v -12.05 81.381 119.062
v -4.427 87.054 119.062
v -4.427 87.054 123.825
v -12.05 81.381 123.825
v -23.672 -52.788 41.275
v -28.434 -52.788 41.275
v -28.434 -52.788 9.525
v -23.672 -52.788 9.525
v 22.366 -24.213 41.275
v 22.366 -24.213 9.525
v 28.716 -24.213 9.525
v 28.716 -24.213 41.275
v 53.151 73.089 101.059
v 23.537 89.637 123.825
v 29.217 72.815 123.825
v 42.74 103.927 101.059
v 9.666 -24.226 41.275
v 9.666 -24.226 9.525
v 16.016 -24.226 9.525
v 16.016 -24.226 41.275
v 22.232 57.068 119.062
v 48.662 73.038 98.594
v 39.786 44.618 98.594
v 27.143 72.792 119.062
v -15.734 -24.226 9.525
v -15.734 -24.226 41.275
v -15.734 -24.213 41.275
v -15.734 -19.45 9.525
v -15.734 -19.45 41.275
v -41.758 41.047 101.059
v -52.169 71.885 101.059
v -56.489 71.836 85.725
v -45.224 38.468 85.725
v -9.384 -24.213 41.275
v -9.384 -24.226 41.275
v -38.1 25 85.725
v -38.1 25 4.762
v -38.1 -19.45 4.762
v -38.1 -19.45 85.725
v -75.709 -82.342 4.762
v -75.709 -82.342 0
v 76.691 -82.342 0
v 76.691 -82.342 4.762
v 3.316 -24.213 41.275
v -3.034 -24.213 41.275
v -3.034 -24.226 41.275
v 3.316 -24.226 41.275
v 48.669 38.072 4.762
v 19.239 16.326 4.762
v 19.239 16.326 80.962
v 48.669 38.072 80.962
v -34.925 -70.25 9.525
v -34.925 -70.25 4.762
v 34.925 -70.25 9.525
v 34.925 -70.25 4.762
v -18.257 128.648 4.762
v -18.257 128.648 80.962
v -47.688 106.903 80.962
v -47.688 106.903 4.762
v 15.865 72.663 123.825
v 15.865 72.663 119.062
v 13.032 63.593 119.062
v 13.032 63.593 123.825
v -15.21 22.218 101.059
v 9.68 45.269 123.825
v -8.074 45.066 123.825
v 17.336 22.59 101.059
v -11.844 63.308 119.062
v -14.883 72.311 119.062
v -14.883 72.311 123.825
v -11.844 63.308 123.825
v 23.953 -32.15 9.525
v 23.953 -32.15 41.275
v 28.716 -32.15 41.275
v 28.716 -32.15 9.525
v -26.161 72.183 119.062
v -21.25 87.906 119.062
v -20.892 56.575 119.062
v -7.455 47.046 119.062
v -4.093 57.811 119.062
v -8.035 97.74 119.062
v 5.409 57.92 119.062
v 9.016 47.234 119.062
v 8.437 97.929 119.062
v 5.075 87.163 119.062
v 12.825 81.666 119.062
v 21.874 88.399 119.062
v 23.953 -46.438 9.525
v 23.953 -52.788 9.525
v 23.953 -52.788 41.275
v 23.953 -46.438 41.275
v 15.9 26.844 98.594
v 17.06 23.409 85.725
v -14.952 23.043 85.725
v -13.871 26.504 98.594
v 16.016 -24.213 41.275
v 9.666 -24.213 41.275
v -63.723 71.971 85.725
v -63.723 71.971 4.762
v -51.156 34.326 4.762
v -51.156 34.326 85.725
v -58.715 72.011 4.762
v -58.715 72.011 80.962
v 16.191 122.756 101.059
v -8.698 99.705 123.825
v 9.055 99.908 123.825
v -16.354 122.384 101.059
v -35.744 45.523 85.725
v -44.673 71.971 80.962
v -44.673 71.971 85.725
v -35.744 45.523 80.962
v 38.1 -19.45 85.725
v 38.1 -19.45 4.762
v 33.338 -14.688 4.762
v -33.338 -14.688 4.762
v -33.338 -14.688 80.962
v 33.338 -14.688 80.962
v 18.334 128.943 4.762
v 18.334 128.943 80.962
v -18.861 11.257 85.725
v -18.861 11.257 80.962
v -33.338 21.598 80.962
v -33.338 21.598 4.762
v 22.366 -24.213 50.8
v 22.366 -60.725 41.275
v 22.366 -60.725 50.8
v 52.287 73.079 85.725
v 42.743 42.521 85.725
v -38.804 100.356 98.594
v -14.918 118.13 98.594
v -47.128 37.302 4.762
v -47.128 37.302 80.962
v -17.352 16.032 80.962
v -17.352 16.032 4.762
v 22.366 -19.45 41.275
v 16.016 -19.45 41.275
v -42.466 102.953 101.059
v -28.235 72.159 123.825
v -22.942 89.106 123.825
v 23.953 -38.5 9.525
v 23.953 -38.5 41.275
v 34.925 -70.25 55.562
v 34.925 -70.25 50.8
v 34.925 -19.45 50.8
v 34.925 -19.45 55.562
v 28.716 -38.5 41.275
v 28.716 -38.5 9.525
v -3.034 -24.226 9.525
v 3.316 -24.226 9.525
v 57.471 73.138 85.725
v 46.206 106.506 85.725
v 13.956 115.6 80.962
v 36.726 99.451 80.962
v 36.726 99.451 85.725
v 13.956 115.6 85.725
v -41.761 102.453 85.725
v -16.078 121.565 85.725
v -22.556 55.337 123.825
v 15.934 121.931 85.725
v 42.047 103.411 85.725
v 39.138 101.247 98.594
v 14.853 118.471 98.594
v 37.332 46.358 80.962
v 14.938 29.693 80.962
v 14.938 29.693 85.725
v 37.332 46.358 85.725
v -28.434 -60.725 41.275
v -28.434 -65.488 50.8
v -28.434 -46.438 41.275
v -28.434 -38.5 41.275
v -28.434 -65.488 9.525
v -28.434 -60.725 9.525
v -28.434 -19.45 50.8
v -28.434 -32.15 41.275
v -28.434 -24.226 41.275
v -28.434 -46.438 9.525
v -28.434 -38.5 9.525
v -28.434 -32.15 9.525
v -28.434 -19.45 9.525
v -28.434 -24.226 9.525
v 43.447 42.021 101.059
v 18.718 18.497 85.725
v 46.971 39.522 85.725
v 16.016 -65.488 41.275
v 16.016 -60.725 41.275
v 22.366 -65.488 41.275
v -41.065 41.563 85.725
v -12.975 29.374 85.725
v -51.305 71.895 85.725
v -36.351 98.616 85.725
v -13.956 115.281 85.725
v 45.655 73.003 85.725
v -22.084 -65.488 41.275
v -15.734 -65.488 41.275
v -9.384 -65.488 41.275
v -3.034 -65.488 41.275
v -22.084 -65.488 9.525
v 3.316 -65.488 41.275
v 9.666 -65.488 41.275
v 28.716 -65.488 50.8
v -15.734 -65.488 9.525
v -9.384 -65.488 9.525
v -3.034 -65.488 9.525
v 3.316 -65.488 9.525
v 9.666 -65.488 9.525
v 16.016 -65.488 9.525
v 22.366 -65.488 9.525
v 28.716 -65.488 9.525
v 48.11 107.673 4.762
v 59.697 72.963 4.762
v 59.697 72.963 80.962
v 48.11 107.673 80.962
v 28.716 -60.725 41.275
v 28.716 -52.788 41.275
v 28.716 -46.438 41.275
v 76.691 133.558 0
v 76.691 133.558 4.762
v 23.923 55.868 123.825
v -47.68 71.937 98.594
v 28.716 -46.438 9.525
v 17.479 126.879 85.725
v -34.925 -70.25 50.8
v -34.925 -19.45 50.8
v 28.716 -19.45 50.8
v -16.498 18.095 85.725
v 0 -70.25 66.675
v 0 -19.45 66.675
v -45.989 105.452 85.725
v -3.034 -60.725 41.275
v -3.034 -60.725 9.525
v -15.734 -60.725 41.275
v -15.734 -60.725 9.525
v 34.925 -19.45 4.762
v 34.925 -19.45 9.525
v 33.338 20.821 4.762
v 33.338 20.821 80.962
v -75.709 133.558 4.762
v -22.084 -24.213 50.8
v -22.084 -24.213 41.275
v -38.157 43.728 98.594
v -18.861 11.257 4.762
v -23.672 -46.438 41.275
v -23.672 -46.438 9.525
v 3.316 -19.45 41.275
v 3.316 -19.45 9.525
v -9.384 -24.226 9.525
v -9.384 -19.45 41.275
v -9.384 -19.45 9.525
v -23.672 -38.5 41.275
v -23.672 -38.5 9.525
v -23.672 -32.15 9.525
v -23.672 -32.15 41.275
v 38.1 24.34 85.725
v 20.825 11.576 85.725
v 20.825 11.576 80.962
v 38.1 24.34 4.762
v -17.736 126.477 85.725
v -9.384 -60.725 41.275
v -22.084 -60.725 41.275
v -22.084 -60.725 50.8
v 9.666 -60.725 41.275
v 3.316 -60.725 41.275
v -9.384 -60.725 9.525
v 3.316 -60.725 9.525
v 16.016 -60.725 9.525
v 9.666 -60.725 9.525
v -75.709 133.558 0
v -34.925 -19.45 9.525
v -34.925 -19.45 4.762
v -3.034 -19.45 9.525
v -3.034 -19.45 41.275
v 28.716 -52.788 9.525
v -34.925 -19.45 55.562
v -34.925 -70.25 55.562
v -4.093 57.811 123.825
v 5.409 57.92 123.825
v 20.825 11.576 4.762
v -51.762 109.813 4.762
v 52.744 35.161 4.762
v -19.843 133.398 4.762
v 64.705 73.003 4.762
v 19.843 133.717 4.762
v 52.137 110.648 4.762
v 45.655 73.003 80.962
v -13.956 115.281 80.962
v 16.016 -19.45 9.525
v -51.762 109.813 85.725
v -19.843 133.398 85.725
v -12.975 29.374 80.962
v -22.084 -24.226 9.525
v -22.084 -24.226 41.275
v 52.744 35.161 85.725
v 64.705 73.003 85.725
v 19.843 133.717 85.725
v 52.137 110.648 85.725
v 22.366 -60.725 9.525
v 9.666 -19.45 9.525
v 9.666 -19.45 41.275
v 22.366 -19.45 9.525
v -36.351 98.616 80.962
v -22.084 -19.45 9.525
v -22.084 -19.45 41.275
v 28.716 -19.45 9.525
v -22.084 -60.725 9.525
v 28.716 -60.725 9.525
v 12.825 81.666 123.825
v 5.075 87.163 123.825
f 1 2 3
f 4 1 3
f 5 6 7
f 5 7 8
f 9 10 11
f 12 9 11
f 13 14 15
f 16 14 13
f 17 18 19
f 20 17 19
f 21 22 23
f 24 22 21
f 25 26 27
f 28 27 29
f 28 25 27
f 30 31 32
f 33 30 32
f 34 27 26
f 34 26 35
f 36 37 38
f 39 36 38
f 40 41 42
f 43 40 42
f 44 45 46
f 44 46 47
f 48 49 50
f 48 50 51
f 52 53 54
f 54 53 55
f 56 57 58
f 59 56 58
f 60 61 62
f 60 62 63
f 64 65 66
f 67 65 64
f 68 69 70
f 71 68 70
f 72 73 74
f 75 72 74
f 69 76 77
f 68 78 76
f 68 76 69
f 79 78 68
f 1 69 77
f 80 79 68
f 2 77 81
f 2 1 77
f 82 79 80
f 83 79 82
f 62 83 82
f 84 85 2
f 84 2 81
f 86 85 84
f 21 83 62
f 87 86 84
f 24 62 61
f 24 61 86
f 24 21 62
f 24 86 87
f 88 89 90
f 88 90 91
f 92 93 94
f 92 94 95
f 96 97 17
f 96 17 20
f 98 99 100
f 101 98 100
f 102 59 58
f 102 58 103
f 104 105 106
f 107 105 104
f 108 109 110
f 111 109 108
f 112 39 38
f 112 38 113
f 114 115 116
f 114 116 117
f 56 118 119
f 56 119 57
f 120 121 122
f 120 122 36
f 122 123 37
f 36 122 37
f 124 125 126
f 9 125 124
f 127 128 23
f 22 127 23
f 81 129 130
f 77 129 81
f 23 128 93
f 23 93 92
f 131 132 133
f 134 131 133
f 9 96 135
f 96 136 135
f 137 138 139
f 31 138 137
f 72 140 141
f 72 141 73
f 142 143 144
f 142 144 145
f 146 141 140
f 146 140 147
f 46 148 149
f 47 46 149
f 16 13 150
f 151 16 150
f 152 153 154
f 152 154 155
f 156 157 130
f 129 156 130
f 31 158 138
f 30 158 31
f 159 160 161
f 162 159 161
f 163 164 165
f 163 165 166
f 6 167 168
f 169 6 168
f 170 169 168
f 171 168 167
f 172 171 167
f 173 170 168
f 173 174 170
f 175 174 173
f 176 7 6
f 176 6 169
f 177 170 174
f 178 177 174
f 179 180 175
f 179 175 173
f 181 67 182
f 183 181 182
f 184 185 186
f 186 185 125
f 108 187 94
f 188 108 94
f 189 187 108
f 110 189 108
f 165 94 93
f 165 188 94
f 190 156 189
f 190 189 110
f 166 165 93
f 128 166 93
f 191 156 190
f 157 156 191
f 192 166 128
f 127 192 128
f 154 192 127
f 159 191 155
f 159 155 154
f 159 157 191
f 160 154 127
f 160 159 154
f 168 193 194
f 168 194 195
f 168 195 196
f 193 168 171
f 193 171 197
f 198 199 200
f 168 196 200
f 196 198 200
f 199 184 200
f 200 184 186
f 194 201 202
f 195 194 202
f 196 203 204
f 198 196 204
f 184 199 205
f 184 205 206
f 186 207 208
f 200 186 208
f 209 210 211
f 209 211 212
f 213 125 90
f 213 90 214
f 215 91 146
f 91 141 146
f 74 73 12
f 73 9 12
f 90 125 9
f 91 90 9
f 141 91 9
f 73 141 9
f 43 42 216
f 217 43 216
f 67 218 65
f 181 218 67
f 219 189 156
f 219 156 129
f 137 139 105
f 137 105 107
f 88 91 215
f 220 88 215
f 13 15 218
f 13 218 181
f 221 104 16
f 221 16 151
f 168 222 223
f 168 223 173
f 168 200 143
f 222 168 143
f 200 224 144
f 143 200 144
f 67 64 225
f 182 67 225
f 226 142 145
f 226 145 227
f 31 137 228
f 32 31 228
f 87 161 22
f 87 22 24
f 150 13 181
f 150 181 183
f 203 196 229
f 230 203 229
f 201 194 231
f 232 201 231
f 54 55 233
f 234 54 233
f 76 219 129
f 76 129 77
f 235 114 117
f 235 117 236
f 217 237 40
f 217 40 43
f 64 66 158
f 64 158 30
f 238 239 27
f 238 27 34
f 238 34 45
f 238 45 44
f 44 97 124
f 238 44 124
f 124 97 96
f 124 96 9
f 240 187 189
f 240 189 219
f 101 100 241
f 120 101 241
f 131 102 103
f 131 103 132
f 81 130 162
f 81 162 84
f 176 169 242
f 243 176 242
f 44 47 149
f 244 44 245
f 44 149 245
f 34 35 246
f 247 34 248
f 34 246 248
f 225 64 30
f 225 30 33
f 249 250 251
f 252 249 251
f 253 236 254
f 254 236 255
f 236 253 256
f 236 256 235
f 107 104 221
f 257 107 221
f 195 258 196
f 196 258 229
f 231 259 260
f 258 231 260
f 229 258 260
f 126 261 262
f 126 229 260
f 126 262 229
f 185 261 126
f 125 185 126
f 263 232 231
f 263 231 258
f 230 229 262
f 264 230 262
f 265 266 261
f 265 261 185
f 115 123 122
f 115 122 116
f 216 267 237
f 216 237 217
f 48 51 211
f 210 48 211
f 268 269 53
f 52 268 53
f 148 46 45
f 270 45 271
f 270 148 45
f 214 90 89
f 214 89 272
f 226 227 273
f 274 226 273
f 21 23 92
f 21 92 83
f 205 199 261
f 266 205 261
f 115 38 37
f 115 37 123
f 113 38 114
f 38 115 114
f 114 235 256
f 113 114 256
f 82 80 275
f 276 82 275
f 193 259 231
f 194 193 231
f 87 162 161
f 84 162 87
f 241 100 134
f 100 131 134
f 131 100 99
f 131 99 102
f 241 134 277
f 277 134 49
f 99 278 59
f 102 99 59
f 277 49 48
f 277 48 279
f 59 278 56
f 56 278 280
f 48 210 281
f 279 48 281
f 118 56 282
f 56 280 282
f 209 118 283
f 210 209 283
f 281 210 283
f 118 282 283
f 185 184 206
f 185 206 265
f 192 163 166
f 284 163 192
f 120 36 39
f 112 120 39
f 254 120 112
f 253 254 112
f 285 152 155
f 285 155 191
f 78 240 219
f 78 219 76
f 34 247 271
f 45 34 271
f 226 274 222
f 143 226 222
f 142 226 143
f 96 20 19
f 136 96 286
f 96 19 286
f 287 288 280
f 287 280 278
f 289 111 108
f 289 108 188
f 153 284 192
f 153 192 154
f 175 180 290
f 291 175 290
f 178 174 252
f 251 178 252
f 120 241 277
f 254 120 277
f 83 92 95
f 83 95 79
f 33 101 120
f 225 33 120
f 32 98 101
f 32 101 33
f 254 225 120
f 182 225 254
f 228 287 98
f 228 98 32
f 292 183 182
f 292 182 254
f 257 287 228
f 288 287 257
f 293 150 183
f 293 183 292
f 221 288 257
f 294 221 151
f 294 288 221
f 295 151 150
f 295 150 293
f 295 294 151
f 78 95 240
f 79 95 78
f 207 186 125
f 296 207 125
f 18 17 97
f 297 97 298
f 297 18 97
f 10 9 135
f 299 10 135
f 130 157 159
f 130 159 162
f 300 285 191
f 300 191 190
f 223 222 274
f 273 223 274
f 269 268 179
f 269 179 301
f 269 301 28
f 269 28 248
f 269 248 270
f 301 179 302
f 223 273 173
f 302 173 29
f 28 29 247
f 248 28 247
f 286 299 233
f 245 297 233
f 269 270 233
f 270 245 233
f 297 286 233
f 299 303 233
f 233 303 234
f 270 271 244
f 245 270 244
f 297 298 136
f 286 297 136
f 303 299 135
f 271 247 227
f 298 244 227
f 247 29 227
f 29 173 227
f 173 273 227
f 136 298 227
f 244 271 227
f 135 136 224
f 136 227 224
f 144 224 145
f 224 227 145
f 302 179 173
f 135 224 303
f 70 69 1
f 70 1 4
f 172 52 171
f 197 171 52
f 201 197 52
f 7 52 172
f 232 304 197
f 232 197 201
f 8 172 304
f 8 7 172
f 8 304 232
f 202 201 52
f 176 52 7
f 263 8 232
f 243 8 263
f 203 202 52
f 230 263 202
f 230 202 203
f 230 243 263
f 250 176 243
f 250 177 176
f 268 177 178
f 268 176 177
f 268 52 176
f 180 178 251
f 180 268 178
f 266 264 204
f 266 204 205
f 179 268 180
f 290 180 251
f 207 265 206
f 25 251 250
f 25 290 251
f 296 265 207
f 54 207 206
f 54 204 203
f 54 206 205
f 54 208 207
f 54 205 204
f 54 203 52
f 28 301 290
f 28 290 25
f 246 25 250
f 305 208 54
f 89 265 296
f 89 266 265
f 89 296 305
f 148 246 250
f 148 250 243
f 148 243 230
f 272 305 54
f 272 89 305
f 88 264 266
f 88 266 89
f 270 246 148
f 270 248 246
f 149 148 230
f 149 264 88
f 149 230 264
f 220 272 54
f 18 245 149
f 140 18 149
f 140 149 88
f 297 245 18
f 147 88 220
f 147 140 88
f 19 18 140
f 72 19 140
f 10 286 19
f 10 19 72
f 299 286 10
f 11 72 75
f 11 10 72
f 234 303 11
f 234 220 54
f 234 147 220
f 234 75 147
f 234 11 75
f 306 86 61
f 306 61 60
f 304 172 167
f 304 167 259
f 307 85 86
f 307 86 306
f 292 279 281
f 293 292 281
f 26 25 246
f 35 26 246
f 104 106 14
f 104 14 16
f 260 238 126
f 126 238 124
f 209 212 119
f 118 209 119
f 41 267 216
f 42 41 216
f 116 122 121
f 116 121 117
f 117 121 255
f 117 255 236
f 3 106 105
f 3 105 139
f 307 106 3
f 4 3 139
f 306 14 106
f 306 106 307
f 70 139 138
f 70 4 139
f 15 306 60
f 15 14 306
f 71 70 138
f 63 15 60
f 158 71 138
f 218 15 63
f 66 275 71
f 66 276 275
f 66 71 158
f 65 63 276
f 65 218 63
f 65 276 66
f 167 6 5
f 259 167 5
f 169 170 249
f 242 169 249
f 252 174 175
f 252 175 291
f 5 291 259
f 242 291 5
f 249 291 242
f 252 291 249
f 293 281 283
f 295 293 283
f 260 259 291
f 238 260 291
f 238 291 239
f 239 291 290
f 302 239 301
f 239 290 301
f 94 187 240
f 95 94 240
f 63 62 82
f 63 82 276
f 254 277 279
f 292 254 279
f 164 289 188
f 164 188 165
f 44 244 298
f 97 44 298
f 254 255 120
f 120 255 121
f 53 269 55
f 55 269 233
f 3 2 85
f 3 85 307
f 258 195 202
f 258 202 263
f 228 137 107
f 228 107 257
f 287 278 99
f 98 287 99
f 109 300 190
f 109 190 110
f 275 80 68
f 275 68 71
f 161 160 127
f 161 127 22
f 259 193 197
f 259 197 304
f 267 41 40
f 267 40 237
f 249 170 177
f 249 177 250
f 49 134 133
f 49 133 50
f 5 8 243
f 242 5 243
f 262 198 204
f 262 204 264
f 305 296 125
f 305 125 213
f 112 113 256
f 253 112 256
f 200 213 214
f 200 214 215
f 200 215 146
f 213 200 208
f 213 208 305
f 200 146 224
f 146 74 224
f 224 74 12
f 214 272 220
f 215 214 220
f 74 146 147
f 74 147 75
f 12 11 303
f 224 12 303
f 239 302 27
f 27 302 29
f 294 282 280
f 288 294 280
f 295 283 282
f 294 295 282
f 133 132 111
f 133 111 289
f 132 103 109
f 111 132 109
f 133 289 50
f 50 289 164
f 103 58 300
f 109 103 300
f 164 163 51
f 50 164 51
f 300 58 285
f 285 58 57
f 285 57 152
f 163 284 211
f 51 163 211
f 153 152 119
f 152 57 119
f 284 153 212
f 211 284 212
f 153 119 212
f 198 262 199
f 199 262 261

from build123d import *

# Parameters (mm, degrees)
F0_W      = 152.4
F0_H      = 215.9
F1_DEPTH  = 4.7625
F3_DEPTH  = 80.9625
F4_T      = -4.7625
F5_DEPTH  = 80.9635
F7_DEPTH  = 80.9625
F8_T      = -4.7625
F9_W      = 6.35
F9_H      = 4.7625
F9_W_2    = 4.7625
F9_H_2    = 6.35
F9_H_3    = 4.7752
F10_DEPTH = 4.7625
F11_W     = 6.35
F11_H     = 4.7752
F11_H_2   = 4.7625
F11_W_2   = 4.7625
F11_H_3   = 6.35
F12_DEPTH = 31.75
F15_W     = 57.15
F15_H     = 46.0375
F15_W_2   = 44.45
F15_H_2   = 36.5125
F16_DEPTH = 9.525
F17_W     = 69.85
F17_H     = 4.7625
F18_DEPTH = 50.8


# Not quite as in the source:
# - a feature names something its author has since deleted; it is built from what else it names


with BuildPart() as f1:
    # F0 (on Top) → F1 (new body)
    with BuildSketch(Plane.XY):
        with Locations((0.4908610135, 25.6078880154)):
            Rectangle(F0_W, F0_H)
    extrude(amount=F1_DEPTH)


with BuildPart() as f3:
    # F2 (on face) → F3 (new body)
    with BuildSketch(Plane.XY.offset(4.7625)):
        Polygon((19.8431090525, 133.7173784268), (-19.8431090525, 133.398397604), (-51.7624417186, 109.813362976), (-63.7227887654, 71.970956145), (-51.1557041384, 34.3256903041), (-18.8613870255, 11.2567774892), (20.8248310796, 11.5757583121), (52.7441637457, 35.16079294), (64.7045107925, 73.0031997711), (52.1374261654, 110.6484656119), align=None)
        Polygon((-36.3506679758, 98.6160539199), (-13.9563353097, 115.2807709686), (13.9563353097, 115.5997517914), (36.7256524226, 99.4511565558), (45.6545107925, 73.0031997711), (37.3323900028, 46.3581019962), (14.9380573368, 29.6933849475), (-12.9746132826, 29.3744041247), (-35.7439303955, 45.5229993603), (-44.6727887654, 71.970956145), align=None, mode=Mode.SUBTRACT)
        Polygon((13.9563353097, 115.5997517914), (-13.9563353097, 115.2807709686), (-36.3506679758, 98.6160539199), (-44.6727887654, 71.970956145), (-35.7439303955, 45.5229993603), (-12.9746132826, 29.3744041247), (14.9380573368, 29.6933849475), (37.3323900028, 46.3581019962), (45.6545107925, 73.0031997711), (36.7256524226, 99.4511565558), align=None)
    extrude(amount=F3_DEPTH)

    # F4
    f4_openings = [f3.faces().sort_by_distance(p)[0] for p in [
        (0.490861, 72.487078, 4.7625),
    ]]
    offset(amount=F4_T, openings=f4_openings)

    # F2 (on face) → F5 (cut, through all)
    with BuildSketch(Plane.XY.offset(4.7625)):
        Polygon((13.9563353097, 115.5997517914), (-13.9563353097, 115.2807709686), (-36.3506679758, 98.6160539199), (-44.6727887654, 71.970956145), (-35.7439303955, 45.5229993603), (-12.9746132826, 29.3744041247), (14.9380573368, 29.6933849475), (37.3323900028, 46.3581019962), (45.6545107925, 73.0031997711), (36.7256524226, 99.4511565558), align=None)
    extrude(amount=F5_DEPTH, mode=Mode.SUBTRACT)

    # F20: sweep along a path in F20_path
    with BuildLine(Plane(origin=(-35.7439303955, 45.5229993603, 85.725), x_dir=(0, -1, 0), z_dir=(0, 0, -1))) as f20_path:
        Line((0, 0), (16.1485952356, -22.7693171129))
        Line((16.1485952356, -22.7693171129), (15.8296144128, -50.6819877323))
        Line((15.8296144128, -50.6819877323), (-0.8351026359, -73.0763203984))
        Line((-0.8351026359, -73.0763203984), (-27.4802004108, -81.398441188))
        Line((-27.4802004108, -81.398441188), (-53.9281571955, -72.4695828181))
        Line((-53.9281571955, -72.4695828181), (-70.0767524311, -49.7002657052))
        Line((-70.0767524311, -49.7002657052), (-69.7577716083, -21.7875950858))
        Line((-69.7577716083, -21.7875950858), (-53.0930545596, 0.6067375802))
        Line((-53.0930545596, 0.6067375802), (-26.4479567847, 8.9288583699))
        Line((-26.4479567847, 8.9288583699), (0, 0))
    # F19 (on Right) → F20 (sweep)
    with BuildSketch(Plane.YZ):
        Polygon((22.392230299, 101.0590724923), (18.283477958, 85.725), (23.2139807672, 85.725), (26.6621709852, 98.5938210877), (47.1308498975, 119.0625), (57.8581578067, 119.0625), (57.8581578067, 123.825), (45.1581578067, 123.825), align=None)
    sweep(path=f20_path.line, transition=Transition.RIGHT)


with BuildPart() as f7:
    # F6 (on face) → F7 (new body)
    with BuildSketch(Plane.XY.offset(4.7625)):
        Polygon((-38.1, -19.4504366256), (38.1, -19.4504366256), (38.1, 24.3402938822), (20.8248310796, 11.5757583121), (-18.8613870255, 11.2567774892), (-38.1, 24.9995633744), align=None)
    extrude(amount=F7_DEPTH)

    # F8
    f8_openings = [f7.faces().sort_by_distance(p)[0] for p in [
        (-0.159074, -2.163387, 4.7625),
        (0.981722, 11.416268, 45.24375),
        (-28.480694, 18.12817, 45.24375),
        (29.462416, 17.958026, 45.24375),
    ]]
    offset(amount=F8_T, openings=f8_openings)


with BuildPart() as f10:
    # F9 (on face) → F10 (new body)
    with BuildSketch(Plane.XY.offset(4.7625)):
        Polygon((-34.925, -70.2504366256), (34.925, -70.2504366256), (34.925, -19.4504366256), (28.715682441, -19.4504366256), (28.715682441, -24.2129366256), (22.365682441, -24.2129366256), (22.365682441, -19.4504366256), (16.015682441, -19.4504366256), (16.015682441, -24.2256366256), (9.665682441, -24.2256366256), (9.665682441, -19.4504366256), (3.315682441, -19.4504366256), (3.315682441, -24.2256366256), (-3.034317559, -24.2256366256), (-3.034317559, -19.4504366256), (-9.384317559, -19.4504366256), (-9.384317559, -24.2256366256), (-15.734317559, -24.2256366256), (-15.734317559, -19.4504366256), (-22.084317559, -19.4504366256), (-22.084317559, -24.2256366256), (-28.434317559, -24.2256366256), (-28.434317559, -19.4504366256), (-34.925, -19.4504366256), align=None)
        with Locations((-25.259317559, -63.1066866256)):
            Rectangle(F9_W, F9_H, mode=Mode.SUBTRACT)
        with Locations((-12.559317559, -63.1066866256)):
            Rectangle(F9_W, F9_H, mode=Mode.SUBTRACT)
        with Locations((0.140682441, -63.1066866256)):
            Rectangle(F9_W, F9_H, mode=Mode.SUBTRACT)
        with Locations((-26.053067559, -49.6129366256)):
            Rectangle(F9_W_2, F9_H_2, mode=Mode.SUBTRACT)
        with Locations((-26.053067559, -35.3254366256)):
            Rectangle(F9_W_2, F9_H_2, mode=Mode.SUBTRACT)
        with Locations((12.840682441, -63.1066866256)):
            Rectangle(F9_W, F9_H, mode=Mode.SUBTRACT)
        with Locations((25.540682441, -63.1066866256)):
            Rectangle(F9_W, F9_H, mode=Mode.SUBTRACT)
        with Locations((26.334432441, -49.6129366256)):
            Rectangle(F9_W_2, F9_H_2, mode=Mode.SUBTRACT)
        with Locations((26.334432441, -35.3254366256)):
            Rectangle(F9_W_2, F9_H_2, mode=Mode.SUBTRACT)
        with Locations((12.840682441, -21.8380366256)):
            Rectangle(F9_W, F9_H_3)
        with Locations((0.140682441, -21.8380366256)):
            Rectangle(F9_W, F9_H_3)
        with Locations((-12.559317559, -21.8380366256)):
            Rectangle(F9_W, F9_H_3)
        with Locations((-25.259317559, -21.8380366256)):
            Rectangle(F9_W, F9_H_3)
        with Locations((25.540682441, -21.8316866256)):
            Rectangle(F9_W, F9_H)
        with Locations((-26.053067559, -49.6129366256)):
            Rectangle(F9_W_2, F9_H_2)
        with Locations((-25.259317559, -63.1066866256)):
            Rectangle(F9_W, F9_H)
        with Locations((-26.053067559, -35.3254366256)):
            Rectangle(F9_W_2, F9_H_2)
        with Locations((-12.559317559, -63.1066866256)):
            Rectangle(F9_W, F9_H)
        with Locations((26.334432441, -35.3254366256)):
            Rectangle(F9_W_2, F9_H_2)
        with Locations((26.334432441, -49.6129366256)):
            Rectangle(F9_W_2, F9_H_2)
        with Locations((25.540682441, -63.1066866256)):
            Rectangle(F9_W, F9_H)
        with Locations((12.840682441, -63.1066866256)):
            Rectangle(F9_W, F9_H)
        with Locations((0.140682441, -63.1066866256)):
            Rectangle(F9_W, F9_H)
    extrude(amount=F10_DEPTH)

    # F11 (on face) → F12 (join)
    with BuildSketch(Plane.XY.offset(9.525)):
        with Locations((-25.259317559, -21.8380366256)):
            Rectangle(F11_W, F11_H)
        with Locations((25.540682441, -21.8316866256)):
            Rectangle(F11_W, F11_H_2)
        with Locations((12.840682441, -21.8380366256)):
            Rectangle(F11_W, F11_H)
        with Locations((0.140682441, -21.8380366256)):
            Rectangle(F11_W, F11_H)
        with Locations((-12.559317559, -21.8380366256)):
            Rectangle(F11_W, F11_H)
        with Locations((-26.053067559, -35.3254366256)):
            Rectangle(F11_W_2, F11_H_3)
        with Locations((-26.053067559, -49.6129366256)):
            Rectangle(F11_W_2, F11_H_3)
        with Locations((-25.259317559, -63.1066866256)):
            Rectangle(F11_W, F11_H_2)
        with Locations((-12.559317559, -63.1066866256)):
            Rectangle(F11_W, F11_H_2)
        with Locations((0.140682441, -63.1066866256)):
            Rectangle(F11_W, F11_H_2)
        with Locations((12.840682441, -63.1066866256)):
            Rectangle(F11_W, F11_H_2)
        with Locations((25.540682441, -63.1066866256)):
            Rectangle(F11_W, F11_H_2)
        with Locations((26.334432441, -49.6129366256)):
            Rectangle(F11_W_2, F11_H_3)
        with Locations((26.334432441, -35.3254366256)):
            Rectangle(F11_W_2, F11_H_3)
    extrude(amount=F12_DEPTH)

    # F15 (on face) → F16 (join)
    with BuildSketch(Plane.XY.offset(41.275)):
        with Locations((0.140682441, -42.4691866256)):
            Rectangle(F15_W, F15_H)
        with Locations((0.140682441, -42.4691866256)):
            Rectangle(F15_W_2, F15_H_2, mode=Mode.SUBTRACT)
    extrude(amount=F16_DEPTH)

    # F17 (on face) → F18 (join)
    with BuildSketch(Plane.XZ.offset(19.4504366256)):
        with Locations((0, 53.18125)):
            Rectangle(F17_W, F17_H)
        Polygon((0, 66.675), (-34.925, 55.5625), (34.925, 55.5625), align=None)
    extrude(amount=F18_DEPTH)


solid = Compound([f1.part, f3.part, f7.part, f10.part])
